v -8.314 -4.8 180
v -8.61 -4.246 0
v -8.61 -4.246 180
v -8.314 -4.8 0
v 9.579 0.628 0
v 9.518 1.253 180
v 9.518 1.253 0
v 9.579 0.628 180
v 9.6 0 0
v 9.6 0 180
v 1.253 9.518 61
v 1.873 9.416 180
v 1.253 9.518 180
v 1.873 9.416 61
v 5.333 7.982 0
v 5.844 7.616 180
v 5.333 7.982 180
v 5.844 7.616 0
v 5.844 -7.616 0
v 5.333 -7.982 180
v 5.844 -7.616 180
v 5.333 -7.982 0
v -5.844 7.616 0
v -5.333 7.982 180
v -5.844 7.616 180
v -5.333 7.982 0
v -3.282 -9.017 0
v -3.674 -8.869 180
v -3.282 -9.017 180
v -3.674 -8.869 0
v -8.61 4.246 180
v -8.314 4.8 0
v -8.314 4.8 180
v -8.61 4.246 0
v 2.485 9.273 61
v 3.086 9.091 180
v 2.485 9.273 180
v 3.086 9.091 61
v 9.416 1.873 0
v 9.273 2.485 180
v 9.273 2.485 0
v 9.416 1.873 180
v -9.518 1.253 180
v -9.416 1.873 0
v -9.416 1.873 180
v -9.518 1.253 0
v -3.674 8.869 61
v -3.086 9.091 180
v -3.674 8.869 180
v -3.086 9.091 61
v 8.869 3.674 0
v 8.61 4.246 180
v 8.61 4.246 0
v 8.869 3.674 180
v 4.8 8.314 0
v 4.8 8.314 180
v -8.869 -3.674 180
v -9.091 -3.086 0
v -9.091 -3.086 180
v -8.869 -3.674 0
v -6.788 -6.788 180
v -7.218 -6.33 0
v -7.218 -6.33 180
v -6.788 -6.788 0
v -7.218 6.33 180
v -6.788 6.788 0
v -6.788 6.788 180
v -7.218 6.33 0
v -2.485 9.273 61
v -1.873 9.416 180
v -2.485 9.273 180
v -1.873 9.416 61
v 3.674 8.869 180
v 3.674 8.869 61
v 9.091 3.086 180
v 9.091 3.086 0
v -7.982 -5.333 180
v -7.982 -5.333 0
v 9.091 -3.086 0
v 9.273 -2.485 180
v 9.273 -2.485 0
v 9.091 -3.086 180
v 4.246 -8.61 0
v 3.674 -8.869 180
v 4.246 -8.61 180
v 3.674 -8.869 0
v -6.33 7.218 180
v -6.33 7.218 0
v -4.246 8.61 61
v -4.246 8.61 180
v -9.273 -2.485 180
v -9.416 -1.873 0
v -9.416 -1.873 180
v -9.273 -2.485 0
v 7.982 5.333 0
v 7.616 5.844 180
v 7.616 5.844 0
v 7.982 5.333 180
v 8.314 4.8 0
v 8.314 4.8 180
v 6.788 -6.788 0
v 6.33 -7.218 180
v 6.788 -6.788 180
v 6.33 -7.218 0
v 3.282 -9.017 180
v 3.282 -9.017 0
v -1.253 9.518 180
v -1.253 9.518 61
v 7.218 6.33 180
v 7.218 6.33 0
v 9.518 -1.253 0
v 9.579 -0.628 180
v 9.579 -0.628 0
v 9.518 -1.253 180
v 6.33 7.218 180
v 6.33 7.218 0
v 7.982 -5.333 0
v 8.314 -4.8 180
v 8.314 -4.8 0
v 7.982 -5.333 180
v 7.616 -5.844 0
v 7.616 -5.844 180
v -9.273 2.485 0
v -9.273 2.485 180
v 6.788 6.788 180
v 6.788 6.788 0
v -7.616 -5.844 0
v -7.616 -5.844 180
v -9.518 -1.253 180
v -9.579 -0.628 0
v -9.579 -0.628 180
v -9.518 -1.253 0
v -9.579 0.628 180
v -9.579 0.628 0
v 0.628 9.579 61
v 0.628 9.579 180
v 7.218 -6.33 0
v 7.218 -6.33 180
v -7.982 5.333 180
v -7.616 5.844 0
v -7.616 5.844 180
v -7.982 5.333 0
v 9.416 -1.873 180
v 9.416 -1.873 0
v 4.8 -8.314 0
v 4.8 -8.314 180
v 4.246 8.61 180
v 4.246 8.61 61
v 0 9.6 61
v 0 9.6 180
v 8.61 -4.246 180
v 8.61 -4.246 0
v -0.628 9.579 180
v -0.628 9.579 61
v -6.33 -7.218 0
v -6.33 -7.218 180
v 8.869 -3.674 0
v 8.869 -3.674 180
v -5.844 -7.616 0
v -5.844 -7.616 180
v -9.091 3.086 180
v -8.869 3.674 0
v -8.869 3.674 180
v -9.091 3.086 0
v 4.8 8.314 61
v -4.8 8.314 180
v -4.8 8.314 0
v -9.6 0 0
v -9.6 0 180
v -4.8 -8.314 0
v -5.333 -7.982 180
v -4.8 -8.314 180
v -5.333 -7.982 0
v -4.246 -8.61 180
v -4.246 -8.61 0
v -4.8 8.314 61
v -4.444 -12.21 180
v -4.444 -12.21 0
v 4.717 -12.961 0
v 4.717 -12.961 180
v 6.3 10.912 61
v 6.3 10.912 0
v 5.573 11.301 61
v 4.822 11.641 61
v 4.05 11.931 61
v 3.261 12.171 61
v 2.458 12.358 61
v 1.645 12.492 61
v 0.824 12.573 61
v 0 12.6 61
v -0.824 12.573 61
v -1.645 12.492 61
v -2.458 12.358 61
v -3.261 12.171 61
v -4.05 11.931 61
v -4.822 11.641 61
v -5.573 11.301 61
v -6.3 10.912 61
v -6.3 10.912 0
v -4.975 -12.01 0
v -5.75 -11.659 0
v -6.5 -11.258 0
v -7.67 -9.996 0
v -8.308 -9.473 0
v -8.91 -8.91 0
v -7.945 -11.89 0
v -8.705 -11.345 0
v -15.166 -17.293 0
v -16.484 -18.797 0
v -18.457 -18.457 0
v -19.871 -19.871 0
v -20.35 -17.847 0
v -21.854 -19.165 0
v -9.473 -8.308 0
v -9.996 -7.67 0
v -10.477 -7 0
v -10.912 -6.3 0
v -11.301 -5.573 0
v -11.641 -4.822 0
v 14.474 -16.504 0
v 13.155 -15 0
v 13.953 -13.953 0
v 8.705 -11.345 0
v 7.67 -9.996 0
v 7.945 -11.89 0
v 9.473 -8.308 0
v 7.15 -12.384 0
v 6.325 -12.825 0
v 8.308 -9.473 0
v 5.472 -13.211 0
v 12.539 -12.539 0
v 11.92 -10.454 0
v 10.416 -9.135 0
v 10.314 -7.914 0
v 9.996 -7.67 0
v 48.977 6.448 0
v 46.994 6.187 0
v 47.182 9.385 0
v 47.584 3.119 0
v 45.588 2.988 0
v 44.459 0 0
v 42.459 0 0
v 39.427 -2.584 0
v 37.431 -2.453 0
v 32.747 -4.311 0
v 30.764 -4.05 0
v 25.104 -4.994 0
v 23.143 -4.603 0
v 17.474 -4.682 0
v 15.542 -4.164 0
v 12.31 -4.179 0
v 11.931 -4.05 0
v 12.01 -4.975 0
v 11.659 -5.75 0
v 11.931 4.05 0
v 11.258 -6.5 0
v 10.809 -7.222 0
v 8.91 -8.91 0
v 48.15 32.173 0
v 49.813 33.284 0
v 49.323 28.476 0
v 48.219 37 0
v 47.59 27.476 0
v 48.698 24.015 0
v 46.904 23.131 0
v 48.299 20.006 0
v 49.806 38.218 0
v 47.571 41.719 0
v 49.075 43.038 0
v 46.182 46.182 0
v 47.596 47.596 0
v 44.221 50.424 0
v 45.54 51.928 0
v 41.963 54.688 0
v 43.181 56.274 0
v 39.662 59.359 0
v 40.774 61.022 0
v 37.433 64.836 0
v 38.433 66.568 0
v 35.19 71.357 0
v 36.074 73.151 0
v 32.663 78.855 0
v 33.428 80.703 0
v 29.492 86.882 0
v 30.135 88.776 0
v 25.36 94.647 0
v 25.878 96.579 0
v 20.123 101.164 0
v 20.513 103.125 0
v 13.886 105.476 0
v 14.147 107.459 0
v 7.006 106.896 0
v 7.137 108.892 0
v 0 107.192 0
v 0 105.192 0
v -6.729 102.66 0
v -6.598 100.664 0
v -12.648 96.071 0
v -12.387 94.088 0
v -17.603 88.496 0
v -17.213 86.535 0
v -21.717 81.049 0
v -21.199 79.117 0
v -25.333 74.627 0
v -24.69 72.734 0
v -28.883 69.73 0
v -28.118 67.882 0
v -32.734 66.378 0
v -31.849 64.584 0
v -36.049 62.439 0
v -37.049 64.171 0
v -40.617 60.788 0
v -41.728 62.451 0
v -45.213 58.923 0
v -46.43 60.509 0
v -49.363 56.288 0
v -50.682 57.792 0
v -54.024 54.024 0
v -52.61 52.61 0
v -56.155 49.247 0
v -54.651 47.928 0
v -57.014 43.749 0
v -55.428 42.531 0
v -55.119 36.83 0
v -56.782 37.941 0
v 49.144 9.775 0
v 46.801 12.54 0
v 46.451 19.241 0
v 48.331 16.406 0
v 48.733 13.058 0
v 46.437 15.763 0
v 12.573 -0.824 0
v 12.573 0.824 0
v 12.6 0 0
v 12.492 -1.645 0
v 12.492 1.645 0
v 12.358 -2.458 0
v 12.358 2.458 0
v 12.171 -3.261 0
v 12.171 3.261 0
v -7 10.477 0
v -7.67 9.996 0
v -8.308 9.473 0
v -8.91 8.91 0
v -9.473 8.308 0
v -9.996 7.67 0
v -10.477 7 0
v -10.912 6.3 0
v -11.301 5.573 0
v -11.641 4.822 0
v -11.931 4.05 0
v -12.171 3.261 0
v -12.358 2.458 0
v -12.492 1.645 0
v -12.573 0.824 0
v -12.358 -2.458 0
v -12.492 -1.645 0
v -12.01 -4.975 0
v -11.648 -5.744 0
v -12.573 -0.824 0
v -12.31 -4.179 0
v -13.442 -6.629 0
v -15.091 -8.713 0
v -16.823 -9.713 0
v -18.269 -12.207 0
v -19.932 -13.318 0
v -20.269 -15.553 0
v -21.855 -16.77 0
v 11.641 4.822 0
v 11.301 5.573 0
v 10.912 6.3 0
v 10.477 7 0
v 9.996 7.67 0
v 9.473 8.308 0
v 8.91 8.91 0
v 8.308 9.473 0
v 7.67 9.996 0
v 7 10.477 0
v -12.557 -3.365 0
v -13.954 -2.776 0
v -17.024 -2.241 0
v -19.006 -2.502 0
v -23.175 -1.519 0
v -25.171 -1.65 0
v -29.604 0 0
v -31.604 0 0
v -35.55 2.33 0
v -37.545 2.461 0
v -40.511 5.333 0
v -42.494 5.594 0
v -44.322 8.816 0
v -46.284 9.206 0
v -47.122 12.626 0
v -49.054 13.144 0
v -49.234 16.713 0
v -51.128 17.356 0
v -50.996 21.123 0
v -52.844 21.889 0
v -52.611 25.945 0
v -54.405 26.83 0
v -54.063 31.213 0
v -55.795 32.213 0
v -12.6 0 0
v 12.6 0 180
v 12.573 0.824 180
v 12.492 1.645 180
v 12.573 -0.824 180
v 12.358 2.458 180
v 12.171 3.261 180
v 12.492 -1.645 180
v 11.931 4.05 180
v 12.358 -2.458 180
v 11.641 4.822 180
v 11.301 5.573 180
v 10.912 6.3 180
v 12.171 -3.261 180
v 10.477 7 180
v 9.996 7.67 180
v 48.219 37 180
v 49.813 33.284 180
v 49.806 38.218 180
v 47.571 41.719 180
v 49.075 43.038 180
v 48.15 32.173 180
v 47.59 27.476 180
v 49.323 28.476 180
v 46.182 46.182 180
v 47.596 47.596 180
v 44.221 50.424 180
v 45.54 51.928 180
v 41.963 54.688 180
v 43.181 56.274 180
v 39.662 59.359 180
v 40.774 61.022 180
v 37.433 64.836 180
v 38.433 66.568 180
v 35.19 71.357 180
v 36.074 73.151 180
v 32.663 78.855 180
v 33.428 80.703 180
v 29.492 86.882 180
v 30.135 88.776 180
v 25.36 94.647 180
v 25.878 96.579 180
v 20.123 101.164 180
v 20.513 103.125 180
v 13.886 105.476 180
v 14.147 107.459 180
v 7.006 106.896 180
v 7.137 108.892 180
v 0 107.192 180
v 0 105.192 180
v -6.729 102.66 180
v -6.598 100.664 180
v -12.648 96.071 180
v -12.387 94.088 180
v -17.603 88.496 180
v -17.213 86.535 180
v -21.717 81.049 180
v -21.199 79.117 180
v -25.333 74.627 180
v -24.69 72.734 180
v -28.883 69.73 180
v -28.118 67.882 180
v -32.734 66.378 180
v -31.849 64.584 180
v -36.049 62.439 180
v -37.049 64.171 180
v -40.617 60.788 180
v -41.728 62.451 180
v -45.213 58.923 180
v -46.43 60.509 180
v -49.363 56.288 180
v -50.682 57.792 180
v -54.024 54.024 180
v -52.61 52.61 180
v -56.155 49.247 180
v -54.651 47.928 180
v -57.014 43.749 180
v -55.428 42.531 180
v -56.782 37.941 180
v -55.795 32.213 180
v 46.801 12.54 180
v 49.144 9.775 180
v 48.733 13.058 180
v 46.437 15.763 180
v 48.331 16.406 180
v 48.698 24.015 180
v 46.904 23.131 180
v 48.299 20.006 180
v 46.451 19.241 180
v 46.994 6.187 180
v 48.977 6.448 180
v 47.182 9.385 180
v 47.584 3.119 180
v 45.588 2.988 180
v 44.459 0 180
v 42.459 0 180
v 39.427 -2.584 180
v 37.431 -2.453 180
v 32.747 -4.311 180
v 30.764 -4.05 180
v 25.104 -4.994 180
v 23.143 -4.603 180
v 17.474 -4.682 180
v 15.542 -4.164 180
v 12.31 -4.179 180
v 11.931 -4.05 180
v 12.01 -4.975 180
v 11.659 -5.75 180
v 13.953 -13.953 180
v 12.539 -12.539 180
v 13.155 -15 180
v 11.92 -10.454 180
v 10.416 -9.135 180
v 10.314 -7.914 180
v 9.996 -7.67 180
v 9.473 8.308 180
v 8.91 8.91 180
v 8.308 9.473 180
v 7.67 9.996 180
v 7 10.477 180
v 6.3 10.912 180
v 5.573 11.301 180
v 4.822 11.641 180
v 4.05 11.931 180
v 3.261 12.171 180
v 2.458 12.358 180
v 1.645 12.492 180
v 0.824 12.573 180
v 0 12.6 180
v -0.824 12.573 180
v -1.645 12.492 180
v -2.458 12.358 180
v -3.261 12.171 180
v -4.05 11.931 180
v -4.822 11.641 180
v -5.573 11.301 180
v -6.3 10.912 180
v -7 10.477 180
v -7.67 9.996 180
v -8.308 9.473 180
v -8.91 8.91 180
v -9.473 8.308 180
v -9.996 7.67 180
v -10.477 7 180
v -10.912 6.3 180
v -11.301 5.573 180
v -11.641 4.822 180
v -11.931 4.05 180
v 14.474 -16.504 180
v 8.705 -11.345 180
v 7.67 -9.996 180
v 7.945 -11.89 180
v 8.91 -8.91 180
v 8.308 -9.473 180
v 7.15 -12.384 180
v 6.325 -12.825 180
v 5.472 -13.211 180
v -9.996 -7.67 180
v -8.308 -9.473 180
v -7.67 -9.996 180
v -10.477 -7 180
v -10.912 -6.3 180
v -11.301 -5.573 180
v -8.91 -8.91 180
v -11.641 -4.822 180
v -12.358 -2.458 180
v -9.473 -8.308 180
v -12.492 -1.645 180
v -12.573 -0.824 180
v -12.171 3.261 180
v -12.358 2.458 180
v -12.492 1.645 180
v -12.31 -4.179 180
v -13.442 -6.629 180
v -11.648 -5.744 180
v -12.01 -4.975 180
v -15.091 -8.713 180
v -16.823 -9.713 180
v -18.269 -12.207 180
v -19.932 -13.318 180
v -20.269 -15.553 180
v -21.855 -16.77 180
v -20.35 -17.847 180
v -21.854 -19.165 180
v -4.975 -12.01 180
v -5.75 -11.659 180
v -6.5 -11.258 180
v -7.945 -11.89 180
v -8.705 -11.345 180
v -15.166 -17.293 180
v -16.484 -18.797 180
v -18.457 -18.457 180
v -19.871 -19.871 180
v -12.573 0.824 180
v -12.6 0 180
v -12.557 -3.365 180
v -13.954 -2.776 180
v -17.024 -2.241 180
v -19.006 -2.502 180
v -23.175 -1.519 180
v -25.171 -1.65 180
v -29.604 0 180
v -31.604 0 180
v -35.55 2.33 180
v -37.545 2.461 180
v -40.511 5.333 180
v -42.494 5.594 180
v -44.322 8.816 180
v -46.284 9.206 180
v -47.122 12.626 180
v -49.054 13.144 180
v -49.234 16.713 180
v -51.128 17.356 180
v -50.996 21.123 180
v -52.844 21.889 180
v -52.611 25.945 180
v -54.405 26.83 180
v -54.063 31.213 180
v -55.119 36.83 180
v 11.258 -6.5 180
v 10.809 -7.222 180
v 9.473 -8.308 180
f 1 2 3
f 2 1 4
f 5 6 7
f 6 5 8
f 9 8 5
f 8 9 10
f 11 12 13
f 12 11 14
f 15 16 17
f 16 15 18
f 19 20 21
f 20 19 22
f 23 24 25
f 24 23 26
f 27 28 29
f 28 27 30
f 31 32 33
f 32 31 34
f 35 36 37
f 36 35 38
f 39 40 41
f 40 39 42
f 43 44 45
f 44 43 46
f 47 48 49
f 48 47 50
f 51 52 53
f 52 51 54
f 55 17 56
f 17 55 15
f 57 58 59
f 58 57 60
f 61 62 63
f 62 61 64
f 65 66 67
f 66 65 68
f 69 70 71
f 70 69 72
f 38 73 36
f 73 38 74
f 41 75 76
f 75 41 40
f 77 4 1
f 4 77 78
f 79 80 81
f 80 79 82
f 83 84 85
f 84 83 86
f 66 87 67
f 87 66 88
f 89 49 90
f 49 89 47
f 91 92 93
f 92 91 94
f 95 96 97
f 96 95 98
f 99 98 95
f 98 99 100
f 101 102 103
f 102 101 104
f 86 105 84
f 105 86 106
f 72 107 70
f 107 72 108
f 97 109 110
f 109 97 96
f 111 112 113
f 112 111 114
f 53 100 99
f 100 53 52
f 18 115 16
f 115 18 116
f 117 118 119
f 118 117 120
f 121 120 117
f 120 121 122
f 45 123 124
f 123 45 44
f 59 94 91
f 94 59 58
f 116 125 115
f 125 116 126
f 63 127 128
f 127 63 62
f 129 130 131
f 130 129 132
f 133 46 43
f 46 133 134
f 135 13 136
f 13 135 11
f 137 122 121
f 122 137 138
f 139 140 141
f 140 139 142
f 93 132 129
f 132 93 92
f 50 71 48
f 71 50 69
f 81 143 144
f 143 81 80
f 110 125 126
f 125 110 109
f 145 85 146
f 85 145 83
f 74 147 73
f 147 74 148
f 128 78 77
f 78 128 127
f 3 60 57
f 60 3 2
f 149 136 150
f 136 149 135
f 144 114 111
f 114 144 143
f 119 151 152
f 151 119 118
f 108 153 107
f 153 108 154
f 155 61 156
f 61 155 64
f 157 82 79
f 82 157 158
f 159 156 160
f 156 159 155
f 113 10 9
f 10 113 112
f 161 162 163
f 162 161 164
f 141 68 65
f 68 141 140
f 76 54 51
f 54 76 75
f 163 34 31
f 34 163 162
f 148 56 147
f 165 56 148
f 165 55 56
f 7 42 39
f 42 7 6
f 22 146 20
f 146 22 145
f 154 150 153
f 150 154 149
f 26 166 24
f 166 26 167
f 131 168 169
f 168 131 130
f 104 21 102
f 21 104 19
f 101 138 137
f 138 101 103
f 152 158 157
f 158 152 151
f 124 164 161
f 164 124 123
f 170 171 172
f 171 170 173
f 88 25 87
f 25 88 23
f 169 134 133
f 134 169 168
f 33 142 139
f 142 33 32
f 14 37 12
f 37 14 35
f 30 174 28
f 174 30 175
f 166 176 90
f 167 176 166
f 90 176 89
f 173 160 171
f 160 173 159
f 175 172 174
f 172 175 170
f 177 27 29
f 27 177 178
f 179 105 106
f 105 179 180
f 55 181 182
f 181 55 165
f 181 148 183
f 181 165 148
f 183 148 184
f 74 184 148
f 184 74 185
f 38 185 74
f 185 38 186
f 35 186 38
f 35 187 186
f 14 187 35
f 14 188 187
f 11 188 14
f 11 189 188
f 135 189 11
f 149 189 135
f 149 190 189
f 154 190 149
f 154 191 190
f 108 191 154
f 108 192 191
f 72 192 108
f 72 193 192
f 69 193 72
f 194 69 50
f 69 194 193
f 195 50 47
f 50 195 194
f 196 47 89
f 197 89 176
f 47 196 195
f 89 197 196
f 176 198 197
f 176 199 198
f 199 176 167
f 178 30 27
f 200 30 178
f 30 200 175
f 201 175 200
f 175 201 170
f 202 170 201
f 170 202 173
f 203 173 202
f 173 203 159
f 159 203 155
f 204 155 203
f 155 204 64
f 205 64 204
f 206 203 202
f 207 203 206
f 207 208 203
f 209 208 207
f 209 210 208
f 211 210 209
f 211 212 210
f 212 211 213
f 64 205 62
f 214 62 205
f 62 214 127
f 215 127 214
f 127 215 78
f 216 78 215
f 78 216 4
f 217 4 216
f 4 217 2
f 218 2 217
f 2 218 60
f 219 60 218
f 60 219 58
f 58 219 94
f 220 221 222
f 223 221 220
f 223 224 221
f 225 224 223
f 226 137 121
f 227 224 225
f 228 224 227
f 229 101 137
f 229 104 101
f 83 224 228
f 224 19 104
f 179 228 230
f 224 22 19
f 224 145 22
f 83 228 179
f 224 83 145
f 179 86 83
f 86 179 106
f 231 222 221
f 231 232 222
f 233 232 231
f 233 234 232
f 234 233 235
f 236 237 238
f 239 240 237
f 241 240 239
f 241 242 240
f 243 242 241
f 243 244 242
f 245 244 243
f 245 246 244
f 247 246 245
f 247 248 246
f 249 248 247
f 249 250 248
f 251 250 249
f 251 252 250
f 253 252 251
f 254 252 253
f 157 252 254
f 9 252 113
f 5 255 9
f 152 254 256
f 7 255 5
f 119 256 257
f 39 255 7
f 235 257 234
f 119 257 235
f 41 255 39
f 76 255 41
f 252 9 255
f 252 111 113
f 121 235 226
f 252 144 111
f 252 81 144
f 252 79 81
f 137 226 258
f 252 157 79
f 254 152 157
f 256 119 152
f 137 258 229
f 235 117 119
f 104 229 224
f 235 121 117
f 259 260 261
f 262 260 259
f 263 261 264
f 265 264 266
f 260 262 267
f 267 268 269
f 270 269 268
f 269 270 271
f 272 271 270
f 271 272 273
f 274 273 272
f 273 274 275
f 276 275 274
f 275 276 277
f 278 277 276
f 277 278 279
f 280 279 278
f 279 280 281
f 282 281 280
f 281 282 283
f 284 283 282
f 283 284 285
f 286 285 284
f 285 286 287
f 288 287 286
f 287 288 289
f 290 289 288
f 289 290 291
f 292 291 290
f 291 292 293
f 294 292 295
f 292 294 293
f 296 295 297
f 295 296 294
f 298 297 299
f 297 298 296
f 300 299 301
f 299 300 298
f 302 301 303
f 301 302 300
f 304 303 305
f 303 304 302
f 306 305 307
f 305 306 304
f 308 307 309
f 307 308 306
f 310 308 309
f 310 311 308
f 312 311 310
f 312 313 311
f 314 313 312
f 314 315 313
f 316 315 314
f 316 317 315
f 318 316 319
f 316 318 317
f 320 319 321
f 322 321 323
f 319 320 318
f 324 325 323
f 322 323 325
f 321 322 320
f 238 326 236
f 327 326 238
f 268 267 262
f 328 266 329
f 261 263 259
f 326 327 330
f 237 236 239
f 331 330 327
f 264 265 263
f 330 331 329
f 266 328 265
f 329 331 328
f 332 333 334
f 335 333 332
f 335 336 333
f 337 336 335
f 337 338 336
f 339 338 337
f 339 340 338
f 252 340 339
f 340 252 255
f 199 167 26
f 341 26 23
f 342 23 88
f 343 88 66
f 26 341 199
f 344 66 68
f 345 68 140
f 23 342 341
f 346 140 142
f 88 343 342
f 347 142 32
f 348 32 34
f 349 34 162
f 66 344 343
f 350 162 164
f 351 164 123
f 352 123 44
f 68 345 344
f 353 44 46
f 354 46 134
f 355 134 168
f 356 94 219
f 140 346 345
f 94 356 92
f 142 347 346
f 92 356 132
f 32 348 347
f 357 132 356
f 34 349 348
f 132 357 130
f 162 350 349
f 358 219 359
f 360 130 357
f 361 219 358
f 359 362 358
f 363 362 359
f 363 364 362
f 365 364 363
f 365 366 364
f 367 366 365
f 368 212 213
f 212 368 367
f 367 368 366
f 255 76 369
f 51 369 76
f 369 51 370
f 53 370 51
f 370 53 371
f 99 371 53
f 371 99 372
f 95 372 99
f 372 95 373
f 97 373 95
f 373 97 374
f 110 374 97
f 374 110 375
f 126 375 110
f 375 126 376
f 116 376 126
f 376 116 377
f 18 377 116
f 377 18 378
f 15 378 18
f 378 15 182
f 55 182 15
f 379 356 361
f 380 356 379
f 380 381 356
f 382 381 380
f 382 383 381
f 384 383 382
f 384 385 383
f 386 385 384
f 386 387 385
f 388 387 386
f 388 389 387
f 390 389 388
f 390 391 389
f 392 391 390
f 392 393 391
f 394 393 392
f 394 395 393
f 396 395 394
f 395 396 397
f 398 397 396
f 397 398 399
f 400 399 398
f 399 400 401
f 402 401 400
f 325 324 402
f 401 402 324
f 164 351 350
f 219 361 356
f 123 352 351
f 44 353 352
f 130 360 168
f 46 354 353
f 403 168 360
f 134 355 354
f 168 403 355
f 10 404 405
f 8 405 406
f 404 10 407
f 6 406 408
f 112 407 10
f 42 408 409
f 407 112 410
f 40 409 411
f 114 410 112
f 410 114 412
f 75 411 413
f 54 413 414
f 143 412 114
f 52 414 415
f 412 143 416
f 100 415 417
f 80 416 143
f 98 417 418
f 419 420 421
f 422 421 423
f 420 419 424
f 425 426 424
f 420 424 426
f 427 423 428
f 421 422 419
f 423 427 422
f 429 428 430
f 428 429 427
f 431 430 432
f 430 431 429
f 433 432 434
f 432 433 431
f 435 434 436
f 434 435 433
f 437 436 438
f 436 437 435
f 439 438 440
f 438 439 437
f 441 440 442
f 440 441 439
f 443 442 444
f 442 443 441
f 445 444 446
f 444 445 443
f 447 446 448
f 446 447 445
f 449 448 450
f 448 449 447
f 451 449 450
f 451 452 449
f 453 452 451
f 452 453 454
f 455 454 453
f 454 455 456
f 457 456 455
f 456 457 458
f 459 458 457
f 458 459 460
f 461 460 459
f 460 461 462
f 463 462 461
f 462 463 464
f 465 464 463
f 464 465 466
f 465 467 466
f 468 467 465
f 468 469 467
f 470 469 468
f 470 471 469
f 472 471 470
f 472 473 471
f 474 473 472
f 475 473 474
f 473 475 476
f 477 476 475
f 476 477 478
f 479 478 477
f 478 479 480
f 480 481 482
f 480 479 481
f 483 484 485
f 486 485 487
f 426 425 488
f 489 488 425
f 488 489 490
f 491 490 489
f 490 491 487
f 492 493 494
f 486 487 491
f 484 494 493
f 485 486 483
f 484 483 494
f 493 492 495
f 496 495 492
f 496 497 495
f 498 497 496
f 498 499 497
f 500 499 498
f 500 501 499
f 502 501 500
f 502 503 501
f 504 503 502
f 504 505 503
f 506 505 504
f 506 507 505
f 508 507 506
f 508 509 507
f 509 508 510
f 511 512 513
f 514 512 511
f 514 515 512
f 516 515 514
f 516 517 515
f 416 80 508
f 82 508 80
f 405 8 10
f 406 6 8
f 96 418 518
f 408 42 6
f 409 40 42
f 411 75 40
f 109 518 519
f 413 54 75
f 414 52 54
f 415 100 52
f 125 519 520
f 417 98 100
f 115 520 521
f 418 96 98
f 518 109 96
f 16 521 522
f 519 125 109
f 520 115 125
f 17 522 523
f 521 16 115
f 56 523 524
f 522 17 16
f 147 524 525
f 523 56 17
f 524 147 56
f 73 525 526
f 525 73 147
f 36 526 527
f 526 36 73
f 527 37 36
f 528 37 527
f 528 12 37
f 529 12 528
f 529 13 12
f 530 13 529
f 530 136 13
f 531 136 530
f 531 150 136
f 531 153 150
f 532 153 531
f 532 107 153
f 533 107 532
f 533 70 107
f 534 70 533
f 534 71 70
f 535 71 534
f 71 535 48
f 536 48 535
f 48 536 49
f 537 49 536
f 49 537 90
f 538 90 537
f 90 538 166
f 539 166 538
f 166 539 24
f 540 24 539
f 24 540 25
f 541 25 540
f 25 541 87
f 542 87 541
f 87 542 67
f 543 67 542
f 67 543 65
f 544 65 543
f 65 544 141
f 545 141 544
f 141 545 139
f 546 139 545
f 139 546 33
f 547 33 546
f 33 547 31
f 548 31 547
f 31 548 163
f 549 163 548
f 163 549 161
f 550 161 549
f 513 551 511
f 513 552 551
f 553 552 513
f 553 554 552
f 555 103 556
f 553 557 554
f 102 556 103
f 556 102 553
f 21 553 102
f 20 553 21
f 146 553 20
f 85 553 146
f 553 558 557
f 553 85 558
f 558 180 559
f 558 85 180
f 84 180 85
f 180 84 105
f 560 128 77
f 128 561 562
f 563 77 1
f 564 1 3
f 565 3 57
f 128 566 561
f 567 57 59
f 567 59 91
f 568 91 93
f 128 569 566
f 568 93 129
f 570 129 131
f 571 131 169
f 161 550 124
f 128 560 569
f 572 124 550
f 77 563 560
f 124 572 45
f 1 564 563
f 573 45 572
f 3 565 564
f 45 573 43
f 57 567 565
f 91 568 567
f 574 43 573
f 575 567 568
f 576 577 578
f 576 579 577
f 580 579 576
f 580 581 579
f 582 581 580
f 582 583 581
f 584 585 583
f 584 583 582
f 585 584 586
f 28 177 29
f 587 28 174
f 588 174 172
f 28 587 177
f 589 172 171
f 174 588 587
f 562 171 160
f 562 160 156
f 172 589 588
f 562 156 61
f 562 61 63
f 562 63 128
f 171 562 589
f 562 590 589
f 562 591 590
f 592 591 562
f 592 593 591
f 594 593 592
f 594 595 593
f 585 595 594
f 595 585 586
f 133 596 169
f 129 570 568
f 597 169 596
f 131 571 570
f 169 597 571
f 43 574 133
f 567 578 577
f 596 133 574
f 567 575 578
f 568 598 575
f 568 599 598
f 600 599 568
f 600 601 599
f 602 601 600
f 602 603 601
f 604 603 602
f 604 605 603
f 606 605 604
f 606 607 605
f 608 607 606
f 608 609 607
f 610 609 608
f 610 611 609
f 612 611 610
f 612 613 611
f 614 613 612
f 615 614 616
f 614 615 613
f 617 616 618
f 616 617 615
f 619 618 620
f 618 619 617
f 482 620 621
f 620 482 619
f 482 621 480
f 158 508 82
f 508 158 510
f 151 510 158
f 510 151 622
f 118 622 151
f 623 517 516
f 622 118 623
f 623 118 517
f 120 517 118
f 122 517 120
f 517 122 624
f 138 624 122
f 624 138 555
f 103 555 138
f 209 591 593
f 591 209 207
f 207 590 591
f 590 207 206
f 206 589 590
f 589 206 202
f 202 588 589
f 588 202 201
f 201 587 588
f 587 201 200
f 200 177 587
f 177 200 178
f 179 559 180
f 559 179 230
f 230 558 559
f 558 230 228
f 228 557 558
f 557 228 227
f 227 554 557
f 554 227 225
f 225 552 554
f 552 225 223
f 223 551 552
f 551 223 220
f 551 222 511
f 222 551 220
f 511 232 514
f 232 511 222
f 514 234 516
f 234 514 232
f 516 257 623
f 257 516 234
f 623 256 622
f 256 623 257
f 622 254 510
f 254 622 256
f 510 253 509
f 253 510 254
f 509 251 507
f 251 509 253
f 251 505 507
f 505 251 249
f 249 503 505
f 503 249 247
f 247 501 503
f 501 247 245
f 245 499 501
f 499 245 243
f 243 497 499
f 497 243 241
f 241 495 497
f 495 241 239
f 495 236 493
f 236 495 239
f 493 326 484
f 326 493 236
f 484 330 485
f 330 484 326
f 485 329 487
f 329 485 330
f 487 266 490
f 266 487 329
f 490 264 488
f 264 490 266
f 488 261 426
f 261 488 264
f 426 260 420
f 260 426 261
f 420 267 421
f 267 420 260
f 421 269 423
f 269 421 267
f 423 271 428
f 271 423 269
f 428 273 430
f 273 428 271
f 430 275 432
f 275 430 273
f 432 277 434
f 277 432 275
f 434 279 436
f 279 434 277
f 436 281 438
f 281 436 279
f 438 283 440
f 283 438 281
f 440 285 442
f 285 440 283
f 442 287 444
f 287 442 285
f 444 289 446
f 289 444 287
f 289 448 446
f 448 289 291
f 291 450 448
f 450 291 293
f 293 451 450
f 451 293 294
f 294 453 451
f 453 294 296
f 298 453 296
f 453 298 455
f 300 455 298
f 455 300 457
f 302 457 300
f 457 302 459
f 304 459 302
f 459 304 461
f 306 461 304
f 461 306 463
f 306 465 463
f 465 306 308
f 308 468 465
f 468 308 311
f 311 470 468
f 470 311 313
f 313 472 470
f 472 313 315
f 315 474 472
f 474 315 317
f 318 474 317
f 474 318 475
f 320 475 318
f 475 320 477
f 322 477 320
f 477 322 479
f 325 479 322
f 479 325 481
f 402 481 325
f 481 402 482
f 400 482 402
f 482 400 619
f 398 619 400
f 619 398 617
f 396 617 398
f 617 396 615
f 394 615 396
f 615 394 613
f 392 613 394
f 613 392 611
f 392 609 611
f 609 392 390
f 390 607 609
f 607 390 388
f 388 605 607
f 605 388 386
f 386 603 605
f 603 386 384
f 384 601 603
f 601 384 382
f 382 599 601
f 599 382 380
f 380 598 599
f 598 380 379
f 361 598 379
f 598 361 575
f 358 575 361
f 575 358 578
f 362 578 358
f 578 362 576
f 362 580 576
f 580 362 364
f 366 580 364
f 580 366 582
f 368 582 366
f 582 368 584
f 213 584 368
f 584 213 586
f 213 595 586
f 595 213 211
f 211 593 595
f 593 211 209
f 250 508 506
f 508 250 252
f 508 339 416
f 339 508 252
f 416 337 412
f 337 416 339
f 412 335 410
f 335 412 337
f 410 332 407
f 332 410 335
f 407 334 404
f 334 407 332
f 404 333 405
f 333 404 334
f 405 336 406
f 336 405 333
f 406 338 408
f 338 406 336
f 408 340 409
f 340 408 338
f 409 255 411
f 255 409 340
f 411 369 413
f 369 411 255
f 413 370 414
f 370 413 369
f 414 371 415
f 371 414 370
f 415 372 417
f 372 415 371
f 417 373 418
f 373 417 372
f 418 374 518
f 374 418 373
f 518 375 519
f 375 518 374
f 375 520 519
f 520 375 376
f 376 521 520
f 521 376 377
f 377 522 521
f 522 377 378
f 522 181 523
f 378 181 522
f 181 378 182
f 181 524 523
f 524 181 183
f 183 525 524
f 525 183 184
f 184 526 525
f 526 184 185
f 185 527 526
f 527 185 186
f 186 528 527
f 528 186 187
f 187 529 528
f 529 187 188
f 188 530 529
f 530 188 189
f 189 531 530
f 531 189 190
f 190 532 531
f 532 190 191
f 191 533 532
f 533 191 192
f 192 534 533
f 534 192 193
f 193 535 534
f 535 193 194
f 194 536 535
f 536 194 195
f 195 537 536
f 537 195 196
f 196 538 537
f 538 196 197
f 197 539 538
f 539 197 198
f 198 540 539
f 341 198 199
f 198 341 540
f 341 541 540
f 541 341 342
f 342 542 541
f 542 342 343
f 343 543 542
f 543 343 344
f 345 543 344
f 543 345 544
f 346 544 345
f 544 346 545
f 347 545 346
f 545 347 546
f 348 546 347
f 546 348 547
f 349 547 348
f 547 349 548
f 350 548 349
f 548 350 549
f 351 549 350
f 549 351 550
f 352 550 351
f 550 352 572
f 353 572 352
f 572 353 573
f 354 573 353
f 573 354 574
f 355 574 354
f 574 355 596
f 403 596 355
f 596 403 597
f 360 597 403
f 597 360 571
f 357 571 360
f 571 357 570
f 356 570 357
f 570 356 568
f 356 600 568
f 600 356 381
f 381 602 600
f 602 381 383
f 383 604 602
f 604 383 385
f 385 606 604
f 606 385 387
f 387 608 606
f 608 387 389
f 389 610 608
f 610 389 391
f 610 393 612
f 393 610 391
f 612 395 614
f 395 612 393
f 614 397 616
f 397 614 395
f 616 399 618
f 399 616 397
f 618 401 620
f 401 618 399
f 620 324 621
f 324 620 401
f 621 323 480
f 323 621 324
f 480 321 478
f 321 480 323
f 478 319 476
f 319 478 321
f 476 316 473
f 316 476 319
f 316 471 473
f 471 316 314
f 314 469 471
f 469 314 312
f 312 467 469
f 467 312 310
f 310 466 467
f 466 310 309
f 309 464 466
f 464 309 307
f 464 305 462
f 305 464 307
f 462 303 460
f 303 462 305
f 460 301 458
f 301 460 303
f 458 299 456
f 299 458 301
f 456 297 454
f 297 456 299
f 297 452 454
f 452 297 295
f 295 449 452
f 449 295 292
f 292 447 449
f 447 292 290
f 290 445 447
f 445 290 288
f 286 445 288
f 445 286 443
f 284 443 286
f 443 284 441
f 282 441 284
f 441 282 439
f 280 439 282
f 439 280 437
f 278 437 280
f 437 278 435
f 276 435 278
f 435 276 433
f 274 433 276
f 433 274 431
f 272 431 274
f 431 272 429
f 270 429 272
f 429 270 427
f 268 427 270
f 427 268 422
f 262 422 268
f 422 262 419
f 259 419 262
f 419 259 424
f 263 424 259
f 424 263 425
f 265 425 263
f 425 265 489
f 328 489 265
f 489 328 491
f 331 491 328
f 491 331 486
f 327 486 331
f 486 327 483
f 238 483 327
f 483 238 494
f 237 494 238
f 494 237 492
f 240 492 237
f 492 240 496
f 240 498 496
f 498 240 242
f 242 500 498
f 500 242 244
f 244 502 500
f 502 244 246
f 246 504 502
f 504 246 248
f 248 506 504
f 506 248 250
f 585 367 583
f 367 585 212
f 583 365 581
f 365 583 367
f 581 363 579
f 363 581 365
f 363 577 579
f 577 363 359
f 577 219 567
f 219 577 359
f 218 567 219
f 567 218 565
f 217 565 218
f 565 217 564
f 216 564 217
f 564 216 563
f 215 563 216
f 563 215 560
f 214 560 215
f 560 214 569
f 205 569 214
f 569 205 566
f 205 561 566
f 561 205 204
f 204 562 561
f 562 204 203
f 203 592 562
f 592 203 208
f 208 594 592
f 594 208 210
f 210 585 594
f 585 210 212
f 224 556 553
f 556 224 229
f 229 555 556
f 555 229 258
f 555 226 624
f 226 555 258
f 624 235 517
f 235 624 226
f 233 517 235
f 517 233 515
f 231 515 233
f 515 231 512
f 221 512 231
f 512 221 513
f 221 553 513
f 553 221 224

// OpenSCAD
// Lampenschirm für Stehlampe – organischer, wellenförmiger Querschnitt
// mit Klemmkragen, der in die Form integriert ist (keine D-Form mehr)
// Alle Maße in Millimetern (Regel: units-mm)
//
// Kontext: context/printer.md, context/tolerances.md und context/materials.md
// waren zum Zeitpunkt der Modellierung leer (siehe Regel: context-first).
// Annahmen aus dem Design-Dialog (siehe auch 001/002):
//   - Baubett >= 200mm Z-Höhe vorhanden -> Schirm wird als ein Teil,
//     stehend, in voller Höhe gedruckt.
//   - Klemmkragen als offener Federclip (C-Ring): Innendurchmesser 0.8mm
//     unter Stangendurchmesser (19.2mm ID auf 20mm Stange) für Vorspannung.
//   - E14-Fassung wird separat an der Stange montiert.
//
// Änderungen gegenüber 010 (Nutzer-Feedback: "Form noch etwas welliger"):
//   - Wellen-Amplitude erhöht (10mm/5mm statt 3mm/1.5mm) und Frequenz leicht
//     angepasst (5/8 statt 4/7) für mehr sichtbare Ausbuchtungen.
//   - Sicher möglich ohne die Klemmen-Anbindung erneut zu gefährden: der
//     harte Deckel (neck_guard_width/max_neck_r) in organic_r() kappt die
//     Kontur nahe der Rückseite unabhängig davon, wie groß die Wellen-
//     Amplitude ist (min(r_free, max_neck_r) wirkt für jeden r_free-Wert,
//     auch sehr große) - die Klemmen-Sicherheit hängt nicht mehr von der
//     Wellenamplitude ab, siehe Regel `verify-parametric-geometry`.
//   - Per Sweep (0.25°-Schritte, volle 360°) erneut verifiziert: Außenkontur
//     bleibt überall >= Kavität, keine Doppel-Kreuzungen nahe der Klemme.

// ---- Parameter ----
shade_height = 180;   // Gesamthöhe des Schirms
wall_t       = 2;     // Wandstärke Schirm (durchgehend, auch am Klemmkragen-Übergang)

rod_d      = 20;                 // Durchmesser der Metallstange
rod_r      = rod_d / 2;
clip_id    = 19.2;               // Innendurchmesser Klemmkragen (Vorspannung, ~0.8mm Untermaß)
clip_r_in  = clip_id / 2;
clip_wall  = 3;                  // Wandstärke Klemmkragen (dicker als Schirmwand, für Klemmkraft)
clip_r_out = clip_r_in + clip_wall;
clip_gap_deg = 40;               // Öffnungswinkel des C-Rings (Montagespalt, zeigt nach -Y)

socket_slot_deg    = 60;              // Öffnungswinkel des Fassungs-Schlitzes (Innenseite, +Y) - Annahme
socket_slot_height = shade_height / 3; // unteres Drittel der Klemme ist auf der Innenseite offen

// Organische Grundform: Potenzfunktion statt Fourier-Reihe, damit die
// Rückseite (θ=270°) über einen breiten Winkelbereich flach bleibt, statt
// steil anzusteigen.
back_r  = 13;     // Zielradius an der Rückseite (θ=270°) - eng am Klemmkragen
front_r = 95;      // Zielradius an der Front (θ=90°)
flatten_power = 2; // höher = flacherer/breiterer "Hals" um die Klemme, aber schmalere Seiten

// Wellen-Überlagerung für den organischen/wellenförmigen Look (Front/Seiten) -
// Amplitude jetzt deutlich stärker (Nutzerwunsch); ungefährlich für die
// Klemme, da neck_guard_width/max_neck_r unabhängig von der Amplitude kappt.
wave_amp1 = 10;  wave_freq1 = 5;  wave_phase1 = 40;
wave_amp2 = 5;   wave_freq2 = 8;  wave_phase2 = 115;
wave_fade_width = 55;   // Welle erreicht erst ab diesem Winkelabstand von der Rückseite volle Stärke

// Sicherheitsgrenzen: garantieren, dass die Kontur nahe der Rückseite den
// Klemmkragen nie verfehlt UND nie enger als der Klemmkragen selbst wird
neck_guard_width = 40;                     // Winkelbereich, in dem der obere Deckel aktiv ist
max_neck_r = clip_r_out + wall_t - 0.3;    // = 14.3mm, garantiert Überlappung mit Sicherheitsabstand
min_r      = 13.0;                          // untere Grenze, IMMER > clip_r_out (12.6mm)

cut_far = 300;   // "unendlich" großer Radius für Schnitte, die garantiert bis nach außen durchbrechen sollen

$fn = 96;

// Winkelabstand zwischen theta und center (0-180°, robust über den 0°/360°-Übergang)
function angle_diff(theta, center) =
    let(d = abs(theta - center))
    (d > 180) ? 360 - d : d;

// Hüllkurve 0 (direkt an der Rückseite) bis 1 (ab wave_fade_width Grad Abstand)
function wave_envelope(theta) =
    let(d = angle_diff(theta, 270))
    (d >= wave_fade_width) ? 1 : (1 - cos(180 * d / wave_fade_width)) / 2;

// Radius der organischen Außenkontur in Abhängigkeit vom Winkel θ (Grad)
function organic_r(theta) =
    let(phi = theta - 90)
    let(u = (1 + cos(phi)) / 2)   // 0 an der Rückseite (θ=270°), 1 an der Front (θ=90°)
    let(base = back_r + (front_r - back_r) * pow(u, flatten_power))
    let(raw_wave = wave_amp1 * sin(wave_freq1 * theta + wave_phase1)
                 + wave_amp2 * sin(wave_freq2 * theta + wave_phase2))
    let(wave = raw_wave * wave_envelope(theta))
    let(r_free = base + wave)
    let(d = angle_diff(theta, 270))
    let(r_guarded = (d < neck_guard_width) ? min(r_free, max_neck_r) : r_free)
    max(r_guarded, min_r);

// Radius der Kavität (Hohlraum-Grenze): normale Wandinnenseite, aber nie
// enger als der Klemmkragen (clip_r_out) - dadurch bleibt der Kragen überall
// solide statt hohl, ganz ohne separate Kreis-Verschneidung.
function cavity_r(theta) =
    max(organic_r(theta) - wall_t, clip_r_out);

// Geschlossenes 2D-Profil, um shrink (mm) nach innen verkleinert
module organic_outline(shrink = 0) {
    step = 360 / $fn;
    polygon(points = [
        for (t = [0 : step : 360 - step])
            [(organic_r(t) - shrink) * cos(t), (organic_r(t) - shrink) * sin(t)]
    ]);
}

// Ringform (Annulus): gefüllte Fläche bis cavity_r(θ) MINUS Kreis(clip_r_out).
// Wichtig: eine reine gefüllte Fläche bis cavity_r(θ) wäre FALSCH - da
// cavity_r(θ) an Winkeln fern der Rückseite sehr groß wird (z.B. ~93mm an
// der Front), würde eine gefüllte Fläche dort den kompletten Klemmkragen
// mit-entfernen. Der Kreisabzug stellt sicher, dass r < clip_r_out IMMER
// massiv bleibt, unabhängig vom Winkel.
module cavity_outline() {
    step = 360 / $fn;
    difference() {
        polygon(points = [
            for (t = [0 : step : 360 - step])
                [cavity_r(t) * cos(t), cavity_r(t) * sin(t)]
        ]);
        circle(r = clip_r_out);
    }
}

// Keilförmiger 2D-Ausschnitt, zentriert auf Winkel 0
module pie_wedge_2d(radius, angle_deg) {
    a = angle_deg / 2;
    polygon(points = [
        [0, 0],
        [radius * cos(a), radius * sin(a)],
        [radius * cos(-a), radius * sin(-a)]
    ]);
}

// 2D-Profil der Wand: durchgehend wall_t dick, mit massivem, nahtlos
// integriertem Klemmkragen-Rohling an der Rückseite
module shell_with_boss_2d() {
    difference() {
        organic_outline(0);
        cavity_outline();
    }
}

module organic_shell() {
    linear_extrude(height = shade_height)
        shell_with_boss_2d();
}

// Radialer Schlitz von z0 bis z1, in Richtung facing_deg ausgerichtet
module radial_slot(radius, angle_deg, facing_deg, z0, z1) {
    translate([0, 0, z0])
        rotate([0, 0, facing_deg])
            linear_extrude(z1 - z0)
                pie_wedge_2d(radius, angle_deg);
}

// Alle Ausschnitte für die Klemme: durchgehende Stangenbohrung + Montagespalt
// (volle Höhe, -Y, bricht bis zur echten Außenwand durch, damit seitlich
// eingeclipst werden kann) + Fassungs-Schlitz (unteres Drittel, +Y, öffnet
// nur bis in den ohnehin dort schon hohlen Innenraum)
module clamp_cutouts() {
    union() {
        translate([0, 0, -1])
            cylinder(r = clip_r_in, h = shade_height + 2);

        radial_slot(cut_far, clip_gap_deg, 270, -1, shade_height + 1);

        radial_slot(clip_r_out + 5, socket_slot_deg, 90, -1, socket_slot_height + 1);
    }
}

// render() erzwingt die vollständige (exakte) Boolesche Berechnung statt der
// schnellen OpenCSG-Live-Vorschau, damit die Klemme auch in der OpenSCAD-
// Vorschau (F5) korrekt dargestellt wird.
render(convexity = 10)
    difference() {
        organic_shell();
        clamp_cutouts();
    }
